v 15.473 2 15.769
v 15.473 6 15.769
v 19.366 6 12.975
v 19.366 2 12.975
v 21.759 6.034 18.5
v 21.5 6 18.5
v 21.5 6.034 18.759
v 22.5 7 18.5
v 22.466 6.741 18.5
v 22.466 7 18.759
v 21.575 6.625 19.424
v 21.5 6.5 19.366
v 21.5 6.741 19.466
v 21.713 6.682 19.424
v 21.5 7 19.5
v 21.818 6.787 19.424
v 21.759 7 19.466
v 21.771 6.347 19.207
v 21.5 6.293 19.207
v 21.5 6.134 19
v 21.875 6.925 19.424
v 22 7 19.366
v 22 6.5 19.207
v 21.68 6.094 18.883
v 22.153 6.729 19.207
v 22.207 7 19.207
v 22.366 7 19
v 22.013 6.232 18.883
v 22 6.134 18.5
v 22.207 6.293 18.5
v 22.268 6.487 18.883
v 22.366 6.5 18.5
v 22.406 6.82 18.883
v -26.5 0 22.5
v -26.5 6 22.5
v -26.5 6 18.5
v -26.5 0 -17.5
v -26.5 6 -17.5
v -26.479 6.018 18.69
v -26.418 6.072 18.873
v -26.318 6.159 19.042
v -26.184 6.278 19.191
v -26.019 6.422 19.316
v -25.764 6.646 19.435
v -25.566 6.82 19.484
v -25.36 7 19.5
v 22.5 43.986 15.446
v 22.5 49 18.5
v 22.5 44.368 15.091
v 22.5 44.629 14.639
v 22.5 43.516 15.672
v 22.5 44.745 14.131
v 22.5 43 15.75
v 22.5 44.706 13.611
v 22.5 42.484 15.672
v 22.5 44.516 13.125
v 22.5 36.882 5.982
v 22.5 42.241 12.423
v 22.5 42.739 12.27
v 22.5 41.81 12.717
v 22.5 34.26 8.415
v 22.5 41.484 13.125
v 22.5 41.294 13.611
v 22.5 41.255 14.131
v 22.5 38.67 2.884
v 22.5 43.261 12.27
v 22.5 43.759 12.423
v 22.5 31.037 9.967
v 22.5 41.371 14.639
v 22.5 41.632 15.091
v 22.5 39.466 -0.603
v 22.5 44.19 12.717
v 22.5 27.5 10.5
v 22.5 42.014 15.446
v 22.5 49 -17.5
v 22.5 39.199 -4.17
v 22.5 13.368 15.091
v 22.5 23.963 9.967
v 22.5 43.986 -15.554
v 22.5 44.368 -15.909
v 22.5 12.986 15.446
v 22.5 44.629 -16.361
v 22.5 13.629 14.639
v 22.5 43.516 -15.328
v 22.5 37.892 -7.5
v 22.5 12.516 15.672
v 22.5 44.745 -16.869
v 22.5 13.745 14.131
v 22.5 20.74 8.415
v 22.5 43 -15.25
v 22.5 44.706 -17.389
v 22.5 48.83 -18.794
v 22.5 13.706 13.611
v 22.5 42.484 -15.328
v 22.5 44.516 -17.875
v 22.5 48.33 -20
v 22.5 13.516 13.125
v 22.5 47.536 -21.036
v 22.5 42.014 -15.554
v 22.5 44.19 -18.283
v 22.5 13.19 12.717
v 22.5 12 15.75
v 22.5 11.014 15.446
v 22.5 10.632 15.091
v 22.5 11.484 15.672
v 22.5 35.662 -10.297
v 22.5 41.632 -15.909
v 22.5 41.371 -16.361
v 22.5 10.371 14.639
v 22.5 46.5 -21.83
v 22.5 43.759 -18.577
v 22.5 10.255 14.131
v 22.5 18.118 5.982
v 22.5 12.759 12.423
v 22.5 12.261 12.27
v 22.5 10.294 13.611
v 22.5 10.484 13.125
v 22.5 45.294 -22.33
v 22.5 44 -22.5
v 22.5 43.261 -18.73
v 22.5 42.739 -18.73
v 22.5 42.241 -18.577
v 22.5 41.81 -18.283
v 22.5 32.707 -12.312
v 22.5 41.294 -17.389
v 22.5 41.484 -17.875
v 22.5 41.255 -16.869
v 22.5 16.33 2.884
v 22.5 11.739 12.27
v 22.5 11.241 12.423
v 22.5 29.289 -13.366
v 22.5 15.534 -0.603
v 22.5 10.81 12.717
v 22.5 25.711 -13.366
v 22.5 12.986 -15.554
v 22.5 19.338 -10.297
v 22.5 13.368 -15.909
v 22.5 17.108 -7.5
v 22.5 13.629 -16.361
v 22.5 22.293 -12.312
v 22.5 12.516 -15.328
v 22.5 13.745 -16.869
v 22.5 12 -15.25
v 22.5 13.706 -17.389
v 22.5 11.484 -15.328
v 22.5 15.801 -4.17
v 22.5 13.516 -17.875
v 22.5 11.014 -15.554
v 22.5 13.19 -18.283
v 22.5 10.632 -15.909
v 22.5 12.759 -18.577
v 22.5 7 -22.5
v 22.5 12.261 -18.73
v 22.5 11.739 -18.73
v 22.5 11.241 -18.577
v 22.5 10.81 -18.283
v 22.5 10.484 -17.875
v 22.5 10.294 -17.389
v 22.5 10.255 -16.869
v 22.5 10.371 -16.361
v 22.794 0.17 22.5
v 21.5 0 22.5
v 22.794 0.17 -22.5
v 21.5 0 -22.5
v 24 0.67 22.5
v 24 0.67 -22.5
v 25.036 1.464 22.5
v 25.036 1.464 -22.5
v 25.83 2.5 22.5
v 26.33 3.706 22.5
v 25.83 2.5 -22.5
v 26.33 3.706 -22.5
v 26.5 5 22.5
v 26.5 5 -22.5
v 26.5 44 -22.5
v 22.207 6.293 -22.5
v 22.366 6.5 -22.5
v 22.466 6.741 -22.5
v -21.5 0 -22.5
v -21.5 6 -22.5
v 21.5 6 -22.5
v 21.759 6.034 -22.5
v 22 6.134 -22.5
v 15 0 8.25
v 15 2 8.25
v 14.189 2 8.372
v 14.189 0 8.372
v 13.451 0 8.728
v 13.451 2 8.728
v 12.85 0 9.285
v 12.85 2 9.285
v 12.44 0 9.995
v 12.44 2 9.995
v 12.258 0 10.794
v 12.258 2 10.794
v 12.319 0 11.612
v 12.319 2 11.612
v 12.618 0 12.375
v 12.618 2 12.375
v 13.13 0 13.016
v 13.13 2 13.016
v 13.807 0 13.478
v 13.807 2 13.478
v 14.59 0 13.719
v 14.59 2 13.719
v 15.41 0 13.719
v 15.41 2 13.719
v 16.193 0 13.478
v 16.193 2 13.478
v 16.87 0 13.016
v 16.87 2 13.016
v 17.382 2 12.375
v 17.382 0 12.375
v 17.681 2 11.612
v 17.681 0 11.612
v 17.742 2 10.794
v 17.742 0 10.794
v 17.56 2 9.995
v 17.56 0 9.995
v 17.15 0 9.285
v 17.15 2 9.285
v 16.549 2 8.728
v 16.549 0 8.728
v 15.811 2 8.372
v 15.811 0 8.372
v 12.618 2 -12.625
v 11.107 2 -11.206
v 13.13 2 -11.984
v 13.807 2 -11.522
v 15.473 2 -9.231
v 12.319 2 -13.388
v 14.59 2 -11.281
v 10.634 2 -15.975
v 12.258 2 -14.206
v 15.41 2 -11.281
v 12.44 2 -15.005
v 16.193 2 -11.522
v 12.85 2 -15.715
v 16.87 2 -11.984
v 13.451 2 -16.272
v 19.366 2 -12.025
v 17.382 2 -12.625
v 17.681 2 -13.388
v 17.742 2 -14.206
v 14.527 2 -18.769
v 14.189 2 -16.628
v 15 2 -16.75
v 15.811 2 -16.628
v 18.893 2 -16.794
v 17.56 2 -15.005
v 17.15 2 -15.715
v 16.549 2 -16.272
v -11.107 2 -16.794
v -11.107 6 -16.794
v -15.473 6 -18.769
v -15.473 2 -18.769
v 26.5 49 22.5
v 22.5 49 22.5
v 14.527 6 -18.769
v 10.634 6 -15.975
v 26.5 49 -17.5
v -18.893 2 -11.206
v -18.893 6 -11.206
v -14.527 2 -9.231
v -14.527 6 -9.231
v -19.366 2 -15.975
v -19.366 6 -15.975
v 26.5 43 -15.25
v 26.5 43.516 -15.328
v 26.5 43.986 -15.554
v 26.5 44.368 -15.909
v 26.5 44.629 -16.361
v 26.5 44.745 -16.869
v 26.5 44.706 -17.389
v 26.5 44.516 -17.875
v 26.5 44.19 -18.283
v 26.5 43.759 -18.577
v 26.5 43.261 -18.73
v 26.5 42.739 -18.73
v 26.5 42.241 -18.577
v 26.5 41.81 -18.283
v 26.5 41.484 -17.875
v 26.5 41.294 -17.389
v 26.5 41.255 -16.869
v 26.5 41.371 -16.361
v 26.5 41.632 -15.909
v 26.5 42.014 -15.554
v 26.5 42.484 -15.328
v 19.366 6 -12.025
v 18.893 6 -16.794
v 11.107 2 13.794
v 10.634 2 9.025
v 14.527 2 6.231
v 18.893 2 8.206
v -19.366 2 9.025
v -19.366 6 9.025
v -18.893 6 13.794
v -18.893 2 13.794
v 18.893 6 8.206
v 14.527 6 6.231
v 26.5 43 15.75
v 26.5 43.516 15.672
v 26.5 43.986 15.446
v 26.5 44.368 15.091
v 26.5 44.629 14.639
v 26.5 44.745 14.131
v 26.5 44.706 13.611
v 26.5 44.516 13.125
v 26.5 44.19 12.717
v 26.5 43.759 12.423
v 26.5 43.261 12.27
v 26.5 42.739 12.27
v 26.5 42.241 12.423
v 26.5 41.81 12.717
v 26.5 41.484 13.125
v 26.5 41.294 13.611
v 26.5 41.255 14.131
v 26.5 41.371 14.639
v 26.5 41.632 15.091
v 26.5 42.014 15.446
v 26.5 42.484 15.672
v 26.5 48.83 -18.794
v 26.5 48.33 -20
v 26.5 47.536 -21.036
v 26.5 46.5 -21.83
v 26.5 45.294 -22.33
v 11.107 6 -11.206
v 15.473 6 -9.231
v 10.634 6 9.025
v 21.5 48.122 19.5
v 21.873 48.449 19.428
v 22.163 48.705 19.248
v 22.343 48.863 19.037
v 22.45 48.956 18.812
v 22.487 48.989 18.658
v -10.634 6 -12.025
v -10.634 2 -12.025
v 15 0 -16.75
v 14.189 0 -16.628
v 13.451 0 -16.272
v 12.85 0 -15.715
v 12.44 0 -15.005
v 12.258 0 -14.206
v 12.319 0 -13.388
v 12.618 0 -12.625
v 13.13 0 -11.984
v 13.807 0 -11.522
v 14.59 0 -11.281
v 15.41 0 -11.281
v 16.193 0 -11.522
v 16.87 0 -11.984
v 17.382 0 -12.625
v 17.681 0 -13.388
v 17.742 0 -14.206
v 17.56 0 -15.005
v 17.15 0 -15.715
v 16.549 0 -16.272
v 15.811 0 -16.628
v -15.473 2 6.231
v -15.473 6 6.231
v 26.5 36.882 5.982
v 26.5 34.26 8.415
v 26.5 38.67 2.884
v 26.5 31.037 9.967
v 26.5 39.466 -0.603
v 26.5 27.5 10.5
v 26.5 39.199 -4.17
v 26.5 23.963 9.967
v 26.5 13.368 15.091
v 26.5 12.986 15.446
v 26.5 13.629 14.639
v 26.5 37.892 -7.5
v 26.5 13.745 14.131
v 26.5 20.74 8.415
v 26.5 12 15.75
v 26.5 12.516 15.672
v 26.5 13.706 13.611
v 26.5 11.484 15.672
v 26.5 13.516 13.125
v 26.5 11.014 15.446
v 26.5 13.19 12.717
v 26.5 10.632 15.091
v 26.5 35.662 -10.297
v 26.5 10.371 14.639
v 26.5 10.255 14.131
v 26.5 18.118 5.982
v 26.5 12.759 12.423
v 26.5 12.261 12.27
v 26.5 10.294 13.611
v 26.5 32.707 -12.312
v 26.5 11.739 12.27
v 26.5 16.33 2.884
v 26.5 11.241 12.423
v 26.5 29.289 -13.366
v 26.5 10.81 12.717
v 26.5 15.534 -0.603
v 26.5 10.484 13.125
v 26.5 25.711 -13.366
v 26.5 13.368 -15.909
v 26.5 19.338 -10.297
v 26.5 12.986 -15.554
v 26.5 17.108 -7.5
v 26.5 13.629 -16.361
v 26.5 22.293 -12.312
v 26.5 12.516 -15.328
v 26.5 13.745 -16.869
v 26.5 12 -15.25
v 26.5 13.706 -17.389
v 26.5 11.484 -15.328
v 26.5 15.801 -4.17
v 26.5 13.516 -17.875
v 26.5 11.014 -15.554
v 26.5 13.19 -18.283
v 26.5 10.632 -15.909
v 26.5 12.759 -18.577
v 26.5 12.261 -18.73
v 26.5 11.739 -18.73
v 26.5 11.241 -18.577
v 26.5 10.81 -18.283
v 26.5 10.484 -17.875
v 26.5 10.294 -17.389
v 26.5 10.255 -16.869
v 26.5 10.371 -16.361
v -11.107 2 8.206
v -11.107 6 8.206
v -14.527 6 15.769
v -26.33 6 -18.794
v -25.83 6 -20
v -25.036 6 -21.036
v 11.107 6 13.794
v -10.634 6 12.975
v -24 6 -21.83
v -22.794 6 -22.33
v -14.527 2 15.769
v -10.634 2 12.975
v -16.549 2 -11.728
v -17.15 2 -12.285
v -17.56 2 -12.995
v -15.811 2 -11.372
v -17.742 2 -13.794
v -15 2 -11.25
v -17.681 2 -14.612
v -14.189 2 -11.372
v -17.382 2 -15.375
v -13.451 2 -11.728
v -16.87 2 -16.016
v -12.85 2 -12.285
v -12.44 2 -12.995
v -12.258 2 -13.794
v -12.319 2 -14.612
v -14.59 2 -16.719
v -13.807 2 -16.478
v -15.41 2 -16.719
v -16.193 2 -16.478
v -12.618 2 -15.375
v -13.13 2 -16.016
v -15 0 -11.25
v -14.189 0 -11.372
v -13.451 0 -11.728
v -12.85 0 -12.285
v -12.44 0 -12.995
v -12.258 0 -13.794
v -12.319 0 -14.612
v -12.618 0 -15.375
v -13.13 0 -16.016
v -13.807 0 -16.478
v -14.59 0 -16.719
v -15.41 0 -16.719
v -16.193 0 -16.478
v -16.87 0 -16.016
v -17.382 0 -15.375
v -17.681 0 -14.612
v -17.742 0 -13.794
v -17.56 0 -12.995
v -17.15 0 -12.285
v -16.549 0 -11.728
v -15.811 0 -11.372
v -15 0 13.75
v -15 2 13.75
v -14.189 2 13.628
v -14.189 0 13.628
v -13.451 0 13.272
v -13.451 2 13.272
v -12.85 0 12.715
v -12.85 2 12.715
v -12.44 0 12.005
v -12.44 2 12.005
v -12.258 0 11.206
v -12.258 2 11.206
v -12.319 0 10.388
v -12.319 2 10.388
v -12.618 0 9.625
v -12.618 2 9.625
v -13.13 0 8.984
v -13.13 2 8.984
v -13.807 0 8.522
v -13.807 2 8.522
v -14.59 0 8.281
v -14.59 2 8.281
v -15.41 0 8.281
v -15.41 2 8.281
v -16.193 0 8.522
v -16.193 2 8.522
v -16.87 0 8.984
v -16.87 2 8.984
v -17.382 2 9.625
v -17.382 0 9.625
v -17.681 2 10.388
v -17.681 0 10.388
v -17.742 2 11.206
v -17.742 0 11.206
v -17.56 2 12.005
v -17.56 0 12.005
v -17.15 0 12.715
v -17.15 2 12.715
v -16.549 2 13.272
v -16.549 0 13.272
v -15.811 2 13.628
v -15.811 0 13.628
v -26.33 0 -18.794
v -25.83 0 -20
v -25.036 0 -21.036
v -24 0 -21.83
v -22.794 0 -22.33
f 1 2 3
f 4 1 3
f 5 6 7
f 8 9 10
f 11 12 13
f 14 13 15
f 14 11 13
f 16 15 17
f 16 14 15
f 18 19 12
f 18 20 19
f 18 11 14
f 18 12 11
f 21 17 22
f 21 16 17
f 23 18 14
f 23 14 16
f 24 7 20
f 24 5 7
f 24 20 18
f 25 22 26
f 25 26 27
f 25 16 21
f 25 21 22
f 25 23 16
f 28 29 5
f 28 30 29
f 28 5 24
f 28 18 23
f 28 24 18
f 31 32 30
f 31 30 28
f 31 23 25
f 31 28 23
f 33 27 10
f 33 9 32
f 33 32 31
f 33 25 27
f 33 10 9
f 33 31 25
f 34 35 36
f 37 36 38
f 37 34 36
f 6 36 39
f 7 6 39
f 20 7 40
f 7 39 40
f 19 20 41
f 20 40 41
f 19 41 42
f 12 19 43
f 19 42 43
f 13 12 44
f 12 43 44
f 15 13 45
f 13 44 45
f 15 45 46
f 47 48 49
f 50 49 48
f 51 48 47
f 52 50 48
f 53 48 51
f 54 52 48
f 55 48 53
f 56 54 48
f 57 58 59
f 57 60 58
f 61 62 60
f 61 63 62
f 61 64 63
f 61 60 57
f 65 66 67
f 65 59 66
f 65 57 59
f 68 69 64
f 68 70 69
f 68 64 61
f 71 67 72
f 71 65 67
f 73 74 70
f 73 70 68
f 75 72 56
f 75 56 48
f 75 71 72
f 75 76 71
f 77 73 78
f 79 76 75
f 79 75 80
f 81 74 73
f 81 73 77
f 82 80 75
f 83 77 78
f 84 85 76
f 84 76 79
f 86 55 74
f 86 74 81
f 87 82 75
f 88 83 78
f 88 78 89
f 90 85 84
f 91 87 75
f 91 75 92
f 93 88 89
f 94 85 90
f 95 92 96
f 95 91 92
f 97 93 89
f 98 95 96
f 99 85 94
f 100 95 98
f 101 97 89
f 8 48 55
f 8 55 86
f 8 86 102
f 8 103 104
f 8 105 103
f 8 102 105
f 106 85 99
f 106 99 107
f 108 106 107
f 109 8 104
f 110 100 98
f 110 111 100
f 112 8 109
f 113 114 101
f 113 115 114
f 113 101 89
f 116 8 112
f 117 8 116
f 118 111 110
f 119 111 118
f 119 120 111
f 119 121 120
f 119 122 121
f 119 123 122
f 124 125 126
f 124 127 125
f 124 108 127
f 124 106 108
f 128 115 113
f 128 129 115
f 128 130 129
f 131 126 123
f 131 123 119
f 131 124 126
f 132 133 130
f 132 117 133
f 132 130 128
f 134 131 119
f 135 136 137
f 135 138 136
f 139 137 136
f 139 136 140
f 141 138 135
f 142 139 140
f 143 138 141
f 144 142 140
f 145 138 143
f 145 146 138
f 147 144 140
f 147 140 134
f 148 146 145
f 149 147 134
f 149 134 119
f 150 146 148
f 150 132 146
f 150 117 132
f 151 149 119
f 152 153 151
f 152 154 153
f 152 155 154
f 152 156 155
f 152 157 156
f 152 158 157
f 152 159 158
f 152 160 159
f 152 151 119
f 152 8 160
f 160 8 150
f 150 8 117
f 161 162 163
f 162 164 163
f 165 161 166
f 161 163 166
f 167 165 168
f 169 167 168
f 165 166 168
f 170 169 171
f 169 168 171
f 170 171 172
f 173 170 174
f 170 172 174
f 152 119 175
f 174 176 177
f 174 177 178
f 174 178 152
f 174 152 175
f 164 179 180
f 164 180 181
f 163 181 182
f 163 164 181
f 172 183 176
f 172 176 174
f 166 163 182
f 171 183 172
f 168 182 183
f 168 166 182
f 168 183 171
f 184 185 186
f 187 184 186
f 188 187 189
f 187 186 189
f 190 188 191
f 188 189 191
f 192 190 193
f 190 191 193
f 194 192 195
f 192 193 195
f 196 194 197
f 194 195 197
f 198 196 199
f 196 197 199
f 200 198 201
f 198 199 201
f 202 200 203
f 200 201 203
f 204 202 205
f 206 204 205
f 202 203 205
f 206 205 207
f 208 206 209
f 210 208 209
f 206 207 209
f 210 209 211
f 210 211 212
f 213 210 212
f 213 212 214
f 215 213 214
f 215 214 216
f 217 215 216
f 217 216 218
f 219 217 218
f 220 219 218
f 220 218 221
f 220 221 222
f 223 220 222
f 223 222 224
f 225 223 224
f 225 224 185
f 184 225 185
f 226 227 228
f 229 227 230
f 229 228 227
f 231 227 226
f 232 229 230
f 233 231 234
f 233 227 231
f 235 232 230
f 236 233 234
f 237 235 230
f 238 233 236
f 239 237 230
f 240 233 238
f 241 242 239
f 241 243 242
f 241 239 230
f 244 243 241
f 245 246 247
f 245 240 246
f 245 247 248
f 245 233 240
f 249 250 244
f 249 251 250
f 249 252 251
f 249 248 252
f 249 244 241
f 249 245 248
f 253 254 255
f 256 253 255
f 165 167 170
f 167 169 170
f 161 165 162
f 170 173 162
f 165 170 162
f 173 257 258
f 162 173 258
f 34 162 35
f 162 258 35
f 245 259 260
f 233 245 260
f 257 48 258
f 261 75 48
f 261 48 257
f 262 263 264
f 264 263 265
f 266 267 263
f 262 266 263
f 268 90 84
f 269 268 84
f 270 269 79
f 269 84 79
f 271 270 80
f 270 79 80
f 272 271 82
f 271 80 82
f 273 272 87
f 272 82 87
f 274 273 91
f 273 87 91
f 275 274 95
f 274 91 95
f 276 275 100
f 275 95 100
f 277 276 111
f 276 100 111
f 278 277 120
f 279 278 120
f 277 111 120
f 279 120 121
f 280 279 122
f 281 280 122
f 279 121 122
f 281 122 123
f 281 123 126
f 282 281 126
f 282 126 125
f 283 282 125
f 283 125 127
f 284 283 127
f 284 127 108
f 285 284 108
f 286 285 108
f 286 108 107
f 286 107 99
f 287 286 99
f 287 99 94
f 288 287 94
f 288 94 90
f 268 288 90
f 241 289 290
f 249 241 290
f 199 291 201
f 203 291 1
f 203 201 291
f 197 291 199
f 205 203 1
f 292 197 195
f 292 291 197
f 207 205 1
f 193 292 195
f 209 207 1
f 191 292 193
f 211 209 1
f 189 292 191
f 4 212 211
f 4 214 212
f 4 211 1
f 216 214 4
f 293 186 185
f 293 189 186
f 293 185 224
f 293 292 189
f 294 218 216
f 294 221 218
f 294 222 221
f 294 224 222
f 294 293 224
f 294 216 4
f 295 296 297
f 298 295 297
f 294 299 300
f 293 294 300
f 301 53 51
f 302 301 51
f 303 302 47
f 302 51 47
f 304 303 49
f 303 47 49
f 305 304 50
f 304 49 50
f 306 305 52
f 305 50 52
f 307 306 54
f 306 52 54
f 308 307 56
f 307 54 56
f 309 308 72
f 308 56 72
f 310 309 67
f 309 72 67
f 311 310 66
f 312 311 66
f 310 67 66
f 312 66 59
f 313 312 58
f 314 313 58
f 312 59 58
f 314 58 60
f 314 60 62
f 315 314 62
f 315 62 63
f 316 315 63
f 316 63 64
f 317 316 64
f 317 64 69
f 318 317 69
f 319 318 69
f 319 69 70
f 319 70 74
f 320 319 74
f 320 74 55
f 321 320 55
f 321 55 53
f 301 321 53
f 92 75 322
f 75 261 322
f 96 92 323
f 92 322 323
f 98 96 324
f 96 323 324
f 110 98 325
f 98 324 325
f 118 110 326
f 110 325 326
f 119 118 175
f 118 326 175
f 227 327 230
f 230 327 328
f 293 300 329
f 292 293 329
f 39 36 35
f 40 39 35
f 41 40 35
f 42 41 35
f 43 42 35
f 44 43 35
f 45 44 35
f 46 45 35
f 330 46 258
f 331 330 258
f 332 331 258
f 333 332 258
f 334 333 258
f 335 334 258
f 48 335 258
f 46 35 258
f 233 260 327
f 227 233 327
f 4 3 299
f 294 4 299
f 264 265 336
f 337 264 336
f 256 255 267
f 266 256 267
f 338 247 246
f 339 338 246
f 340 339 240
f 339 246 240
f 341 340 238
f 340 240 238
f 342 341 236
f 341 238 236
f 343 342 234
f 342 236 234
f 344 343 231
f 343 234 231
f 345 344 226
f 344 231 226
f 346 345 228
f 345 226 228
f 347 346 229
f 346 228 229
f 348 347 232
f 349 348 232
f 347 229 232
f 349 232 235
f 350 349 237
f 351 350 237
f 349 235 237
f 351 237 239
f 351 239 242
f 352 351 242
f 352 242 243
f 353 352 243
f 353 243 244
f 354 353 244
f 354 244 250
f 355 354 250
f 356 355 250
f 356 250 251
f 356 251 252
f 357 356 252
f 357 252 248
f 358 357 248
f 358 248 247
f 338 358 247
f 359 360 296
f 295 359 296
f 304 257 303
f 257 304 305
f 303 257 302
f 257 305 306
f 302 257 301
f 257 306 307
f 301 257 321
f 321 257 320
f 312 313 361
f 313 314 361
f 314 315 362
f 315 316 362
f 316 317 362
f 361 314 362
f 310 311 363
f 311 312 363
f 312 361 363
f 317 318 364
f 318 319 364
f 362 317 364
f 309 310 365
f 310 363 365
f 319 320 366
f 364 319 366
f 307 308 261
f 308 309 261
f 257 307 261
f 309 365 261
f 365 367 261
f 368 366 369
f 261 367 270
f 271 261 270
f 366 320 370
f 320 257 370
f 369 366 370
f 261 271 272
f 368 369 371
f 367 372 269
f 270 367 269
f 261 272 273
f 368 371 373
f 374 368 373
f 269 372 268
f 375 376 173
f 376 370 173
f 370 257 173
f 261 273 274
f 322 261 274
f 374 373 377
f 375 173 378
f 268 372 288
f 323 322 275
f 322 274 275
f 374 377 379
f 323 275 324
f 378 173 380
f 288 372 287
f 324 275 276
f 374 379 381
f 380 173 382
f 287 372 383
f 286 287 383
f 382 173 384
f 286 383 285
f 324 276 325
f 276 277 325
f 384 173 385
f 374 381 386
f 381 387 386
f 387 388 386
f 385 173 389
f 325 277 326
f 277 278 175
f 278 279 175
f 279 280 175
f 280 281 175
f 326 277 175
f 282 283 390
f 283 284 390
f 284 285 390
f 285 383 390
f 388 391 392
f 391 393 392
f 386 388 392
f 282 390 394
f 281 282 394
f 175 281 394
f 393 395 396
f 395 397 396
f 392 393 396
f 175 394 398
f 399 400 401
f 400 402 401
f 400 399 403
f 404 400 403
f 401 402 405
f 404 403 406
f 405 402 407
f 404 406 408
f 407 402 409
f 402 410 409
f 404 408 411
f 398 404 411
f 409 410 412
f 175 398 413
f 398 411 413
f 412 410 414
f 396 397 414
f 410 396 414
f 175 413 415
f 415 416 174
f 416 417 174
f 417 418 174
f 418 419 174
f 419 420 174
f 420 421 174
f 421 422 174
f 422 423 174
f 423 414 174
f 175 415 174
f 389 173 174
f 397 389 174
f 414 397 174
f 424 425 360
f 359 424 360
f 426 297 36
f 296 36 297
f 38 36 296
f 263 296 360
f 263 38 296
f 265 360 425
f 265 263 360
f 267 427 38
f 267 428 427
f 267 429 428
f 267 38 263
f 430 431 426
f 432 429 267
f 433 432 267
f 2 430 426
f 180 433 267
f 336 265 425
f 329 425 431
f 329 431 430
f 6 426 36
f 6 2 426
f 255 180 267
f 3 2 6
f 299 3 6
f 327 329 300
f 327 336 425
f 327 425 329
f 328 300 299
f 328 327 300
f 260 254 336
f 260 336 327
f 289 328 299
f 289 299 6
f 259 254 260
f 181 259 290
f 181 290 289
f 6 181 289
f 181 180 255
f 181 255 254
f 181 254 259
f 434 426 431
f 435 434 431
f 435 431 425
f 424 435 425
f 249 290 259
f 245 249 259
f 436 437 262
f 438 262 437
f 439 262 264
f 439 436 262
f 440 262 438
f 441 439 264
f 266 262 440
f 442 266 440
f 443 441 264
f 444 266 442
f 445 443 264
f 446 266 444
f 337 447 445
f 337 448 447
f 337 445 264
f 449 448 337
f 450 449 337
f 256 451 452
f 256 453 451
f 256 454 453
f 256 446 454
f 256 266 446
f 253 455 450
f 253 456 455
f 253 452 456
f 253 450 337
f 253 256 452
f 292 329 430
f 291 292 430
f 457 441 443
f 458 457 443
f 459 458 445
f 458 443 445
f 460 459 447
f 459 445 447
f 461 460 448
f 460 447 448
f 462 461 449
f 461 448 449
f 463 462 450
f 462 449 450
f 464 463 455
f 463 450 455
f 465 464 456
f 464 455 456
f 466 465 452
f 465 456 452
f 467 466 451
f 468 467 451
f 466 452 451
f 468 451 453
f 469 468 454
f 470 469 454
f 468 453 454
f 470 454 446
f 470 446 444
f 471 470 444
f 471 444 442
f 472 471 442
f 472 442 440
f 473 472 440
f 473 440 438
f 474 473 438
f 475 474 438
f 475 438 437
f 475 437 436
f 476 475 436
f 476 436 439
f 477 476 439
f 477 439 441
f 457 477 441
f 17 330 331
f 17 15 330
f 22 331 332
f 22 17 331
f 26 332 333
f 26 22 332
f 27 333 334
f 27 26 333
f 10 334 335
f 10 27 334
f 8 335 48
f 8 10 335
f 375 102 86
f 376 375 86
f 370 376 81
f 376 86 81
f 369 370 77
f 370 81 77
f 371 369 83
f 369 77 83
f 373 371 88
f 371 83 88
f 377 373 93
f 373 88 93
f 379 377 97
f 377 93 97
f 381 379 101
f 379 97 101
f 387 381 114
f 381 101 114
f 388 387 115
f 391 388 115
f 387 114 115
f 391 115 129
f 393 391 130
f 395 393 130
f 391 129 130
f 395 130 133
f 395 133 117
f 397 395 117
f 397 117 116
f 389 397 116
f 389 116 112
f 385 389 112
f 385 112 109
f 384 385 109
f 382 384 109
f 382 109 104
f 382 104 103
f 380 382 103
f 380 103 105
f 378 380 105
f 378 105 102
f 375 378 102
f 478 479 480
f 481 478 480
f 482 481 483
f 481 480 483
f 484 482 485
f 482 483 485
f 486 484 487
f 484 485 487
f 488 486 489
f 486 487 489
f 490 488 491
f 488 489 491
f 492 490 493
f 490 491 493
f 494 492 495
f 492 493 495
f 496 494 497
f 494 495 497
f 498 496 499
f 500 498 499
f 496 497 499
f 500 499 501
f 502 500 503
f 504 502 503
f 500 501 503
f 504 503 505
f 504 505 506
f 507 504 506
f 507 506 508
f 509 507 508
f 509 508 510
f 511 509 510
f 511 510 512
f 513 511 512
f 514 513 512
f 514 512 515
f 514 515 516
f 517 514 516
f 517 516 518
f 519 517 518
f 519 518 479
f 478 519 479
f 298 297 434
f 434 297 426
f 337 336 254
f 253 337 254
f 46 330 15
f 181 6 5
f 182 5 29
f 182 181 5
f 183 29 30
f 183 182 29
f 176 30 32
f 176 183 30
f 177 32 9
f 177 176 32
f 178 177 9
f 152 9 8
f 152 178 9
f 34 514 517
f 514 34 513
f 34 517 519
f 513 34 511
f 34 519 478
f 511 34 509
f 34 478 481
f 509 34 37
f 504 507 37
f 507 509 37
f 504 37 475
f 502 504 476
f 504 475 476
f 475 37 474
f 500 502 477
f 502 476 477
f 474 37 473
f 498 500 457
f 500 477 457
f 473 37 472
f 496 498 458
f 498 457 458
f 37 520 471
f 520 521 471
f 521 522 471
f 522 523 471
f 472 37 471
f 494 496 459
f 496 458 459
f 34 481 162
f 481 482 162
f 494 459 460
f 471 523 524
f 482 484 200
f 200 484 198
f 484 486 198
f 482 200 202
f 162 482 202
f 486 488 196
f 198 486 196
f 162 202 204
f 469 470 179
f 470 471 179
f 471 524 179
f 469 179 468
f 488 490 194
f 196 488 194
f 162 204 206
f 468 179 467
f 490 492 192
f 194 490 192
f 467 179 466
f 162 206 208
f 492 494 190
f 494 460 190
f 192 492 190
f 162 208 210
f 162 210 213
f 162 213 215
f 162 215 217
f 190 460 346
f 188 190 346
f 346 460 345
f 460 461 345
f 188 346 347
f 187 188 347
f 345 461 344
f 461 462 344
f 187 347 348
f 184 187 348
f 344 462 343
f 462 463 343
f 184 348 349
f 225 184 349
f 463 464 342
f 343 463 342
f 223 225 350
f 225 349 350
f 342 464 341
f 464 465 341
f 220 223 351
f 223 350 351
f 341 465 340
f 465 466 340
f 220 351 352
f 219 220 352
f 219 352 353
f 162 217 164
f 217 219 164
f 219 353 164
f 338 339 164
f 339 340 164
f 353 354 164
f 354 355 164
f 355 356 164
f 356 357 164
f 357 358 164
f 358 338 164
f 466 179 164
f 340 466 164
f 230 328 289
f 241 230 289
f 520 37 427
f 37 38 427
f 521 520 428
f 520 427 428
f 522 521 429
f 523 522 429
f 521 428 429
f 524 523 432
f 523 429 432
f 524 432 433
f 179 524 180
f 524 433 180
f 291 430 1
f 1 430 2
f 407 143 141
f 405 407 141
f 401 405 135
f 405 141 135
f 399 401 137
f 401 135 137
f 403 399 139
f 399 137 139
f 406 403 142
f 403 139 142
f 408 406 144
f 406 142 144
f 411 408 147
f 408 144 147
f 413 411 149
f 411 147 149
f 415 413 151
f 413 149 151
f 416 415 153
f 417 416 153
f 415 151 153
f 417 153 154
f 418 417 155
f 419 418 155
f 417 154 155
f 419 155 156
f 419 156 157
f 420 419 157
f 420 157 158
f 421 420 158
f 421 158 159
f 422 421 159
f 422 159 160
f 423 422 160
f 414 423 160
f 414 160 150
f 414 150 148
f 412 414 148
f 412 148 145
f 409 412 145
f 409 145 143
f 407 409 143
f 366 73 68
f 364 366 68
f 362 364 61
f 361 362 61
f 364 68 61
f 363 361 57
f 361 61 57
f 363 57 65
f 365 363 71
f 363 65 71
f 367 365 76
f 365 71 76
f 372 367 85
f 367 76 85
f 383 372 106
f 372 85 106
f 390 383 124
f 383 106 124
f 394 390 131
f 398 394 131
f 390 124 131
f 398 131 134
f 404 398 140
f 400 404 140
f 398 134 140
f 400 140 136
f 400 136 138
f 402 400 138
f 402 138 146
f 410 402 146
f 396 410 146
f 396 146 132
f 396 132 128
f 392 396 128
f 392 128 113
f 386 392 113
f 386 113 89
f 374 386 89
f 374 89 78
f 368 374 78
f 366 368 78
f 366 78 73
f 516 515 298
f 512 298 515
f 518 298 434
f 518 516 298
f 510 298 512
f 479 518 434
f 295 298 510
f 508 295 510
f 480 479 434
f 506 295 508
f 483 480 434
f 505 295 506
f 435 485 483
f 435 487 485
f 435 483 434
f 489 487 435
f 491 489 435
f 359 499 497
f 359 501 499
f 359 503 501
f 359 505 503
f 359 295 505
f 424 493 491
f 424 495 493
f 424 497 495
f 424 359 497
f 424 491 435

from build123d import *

# Parameters (mm, degrees)
ESBO_O1_W                = 53
ESBO_O1_H                = 45
RESSALTO_EXTRUS_O1_DEPTH = 6
ESBO_O2_W                = 4
ESBO_O2_H                = 45
RESSALTO_EXTRUS_O2_DEPTH = 43
RESSALTO_EXTRUS_O3_DEPTH = 3
ESBO_O4_R                = 12
ESBO_O4_R_2              = 1.75
CORTE_EXTRUS_O1_DEPTH    = 73.857738093
ESBO_O5_R                = 2.75
CORTE_EXTRUS_O2_DEPTH    = 56.294665204
FILETE1_R                = 5
FILETE2_R                = 1
CORTE_EXTRUS_O4_DEPTH    = 4
FILETE3_R                = 5


with BuildPart() as part:
    # Esboço1 → Ressalto-extrusão1 (new body)
    with BuildSketch(Plane(origin=(0, 0, 0), x_dir=(1, 0, 0), z_dir=(0, 1, 0))):
        Rectangle(ESBO_O1_W, ESBO_O1_H)
    extrude(amount=RESSALTO_EXTRUS_O1_DEPTH)

    # Esboço2 → Ressalto-extrusão2 (add)
    with BuildSketch(Plane(origin=(0, 6, 0), x_dir=(1, 0, 0), z_dir=(0, 1, 0))):
        with Locations((24.5, 0)):
            Rectangle(ESBO_O2_W, ESBO_O2_H)
    extrude(amount=RESSALTO_EXTRUS_O2_DEPTH)

    # Esboço3 → Ressalto-extrusão3 (add)
    with BuildSketch(Plane.XY.offset(22.5)):
        Polygon((-26.5, 6), (22.5, 49), (22.5, 6), align=None)
    extrude(amount=-RESSALTO_EXTRUS_O3_DEPTH)

    # Esboço4 → Corte-extrusão1 (cut, through all)
    with BuildSketch(Plane.ZY.offset(-22.5)):
        with Locations((-1.5, 27.5)):
            Circle(ESBO_O4_R)
        with Locations((-17, 43)):
            Circle(ESBO_O4_R_2)
        with Locations((14, 43)):
            Circle(ESBO_O4_R_2)
        with Locations((14, 12)):
            Circle(ESBO_O4_R_2)
        with Locations((-17, 12)):
            Circle(ESBO_O4_R_2)
    extrude(amount=-CORTE_EXTRUS_O1_DEPTH, mode=Mode.SUBTRACT)

    # Esboço5 → Corte-extrusão2 (cut, through all)
    with BuildSketch(Plane(origin=(0, 6, 0), x_dir=(1, 0, 0), z_dir=(0, 1, 0))):
        with Locations(Location((-15, 14, 0), (0, 0, 270))):
            Circle(ESBO_O5_R)
        with Locations(Location((-15, -11, 0), (0, 0, 270))):
            Circle(ESBO_O5_R)
        with Locations(Location((15, -11, 0), (0, 0, 90))):
            Circle(ESBO_O5_R)
        with Locations(Location((15, 14, 0), (0, 0, 90))):
            Circle(ESBO_O5_R)
    extrude(amount=-CORTE_EXTRUS_O2_DEPTH, mode=Mode.SUBTRACT)

    # Filete1
    filete1_edges = [part.edges().sort_by_distance(p)[0] for p in [
        (24.5, 49, -22.5),
        (-26.5, 3, -22.5),
    ]]
    fillet(filete1_edges, radius=FILETE1_R)

    # Filete2
    filete2_edges = [part.edges().sort_by_distance(p)[0] for p in [
        (22.5, 6, -1.5),
        (-2, 6, 19.5),
        (22.5, 27.5, 19.5),
    ]]
    fillet(filete2_edges, radius=FILETE2_R)

    # Esboço7 → Corte-extrusão4 (cut)
    with BuildSketch(Plane(origin=(0, 6, 0), x_dir=(1, 0, 0), z_dir=(0, 1, 0))):
        Polygon((15.473054225, 9.231399258), (19.366256495, 12.025376605), (18.89320227, 16.793977347), (14.526945775, 18.768600742), (10.633743505, 15.974623395), (11.10679773, 11.206022653), align=None)
        Polygon((-14.526945775, 9.231399258), (-10.633743505, 12.025376605), (-11.10679773, 16.793977347), (-15.473054225, 18.768600742), (-19.366256495, 15.974623395), (-18.89320227, 11.206022653), align=None)
        Polygon((15.473054225, -15.768600742), (19.366256495, -12.974623395), (18.89320227, -8.206022653), (14.526945775, -6.231399258), (10.633743505, -9.025376605), (11.10679773, -13.793977347), align=None)
        Polygon((-14.526945775, -15.768600742), (-10.633743505, -12.974623395), (-11.10679773, -8.206022653), (-15.473054225, -6.231399258), (-19.366256495, -9.025376605), (-18.89320227, -13.793977347), align=None)
    extrude(amount=-CORTE_EXTRUS_O4_DEPTH, mode=Mode.SUBTRACT)

    # Filete3
    filete3_edges = [part.edges().sort_by_distance(p)[0] for p in [
        (26.5, 0, 0),
    ]]
    fillet(filete3_edges, radius=FILETE3_R)


solid = part.part
